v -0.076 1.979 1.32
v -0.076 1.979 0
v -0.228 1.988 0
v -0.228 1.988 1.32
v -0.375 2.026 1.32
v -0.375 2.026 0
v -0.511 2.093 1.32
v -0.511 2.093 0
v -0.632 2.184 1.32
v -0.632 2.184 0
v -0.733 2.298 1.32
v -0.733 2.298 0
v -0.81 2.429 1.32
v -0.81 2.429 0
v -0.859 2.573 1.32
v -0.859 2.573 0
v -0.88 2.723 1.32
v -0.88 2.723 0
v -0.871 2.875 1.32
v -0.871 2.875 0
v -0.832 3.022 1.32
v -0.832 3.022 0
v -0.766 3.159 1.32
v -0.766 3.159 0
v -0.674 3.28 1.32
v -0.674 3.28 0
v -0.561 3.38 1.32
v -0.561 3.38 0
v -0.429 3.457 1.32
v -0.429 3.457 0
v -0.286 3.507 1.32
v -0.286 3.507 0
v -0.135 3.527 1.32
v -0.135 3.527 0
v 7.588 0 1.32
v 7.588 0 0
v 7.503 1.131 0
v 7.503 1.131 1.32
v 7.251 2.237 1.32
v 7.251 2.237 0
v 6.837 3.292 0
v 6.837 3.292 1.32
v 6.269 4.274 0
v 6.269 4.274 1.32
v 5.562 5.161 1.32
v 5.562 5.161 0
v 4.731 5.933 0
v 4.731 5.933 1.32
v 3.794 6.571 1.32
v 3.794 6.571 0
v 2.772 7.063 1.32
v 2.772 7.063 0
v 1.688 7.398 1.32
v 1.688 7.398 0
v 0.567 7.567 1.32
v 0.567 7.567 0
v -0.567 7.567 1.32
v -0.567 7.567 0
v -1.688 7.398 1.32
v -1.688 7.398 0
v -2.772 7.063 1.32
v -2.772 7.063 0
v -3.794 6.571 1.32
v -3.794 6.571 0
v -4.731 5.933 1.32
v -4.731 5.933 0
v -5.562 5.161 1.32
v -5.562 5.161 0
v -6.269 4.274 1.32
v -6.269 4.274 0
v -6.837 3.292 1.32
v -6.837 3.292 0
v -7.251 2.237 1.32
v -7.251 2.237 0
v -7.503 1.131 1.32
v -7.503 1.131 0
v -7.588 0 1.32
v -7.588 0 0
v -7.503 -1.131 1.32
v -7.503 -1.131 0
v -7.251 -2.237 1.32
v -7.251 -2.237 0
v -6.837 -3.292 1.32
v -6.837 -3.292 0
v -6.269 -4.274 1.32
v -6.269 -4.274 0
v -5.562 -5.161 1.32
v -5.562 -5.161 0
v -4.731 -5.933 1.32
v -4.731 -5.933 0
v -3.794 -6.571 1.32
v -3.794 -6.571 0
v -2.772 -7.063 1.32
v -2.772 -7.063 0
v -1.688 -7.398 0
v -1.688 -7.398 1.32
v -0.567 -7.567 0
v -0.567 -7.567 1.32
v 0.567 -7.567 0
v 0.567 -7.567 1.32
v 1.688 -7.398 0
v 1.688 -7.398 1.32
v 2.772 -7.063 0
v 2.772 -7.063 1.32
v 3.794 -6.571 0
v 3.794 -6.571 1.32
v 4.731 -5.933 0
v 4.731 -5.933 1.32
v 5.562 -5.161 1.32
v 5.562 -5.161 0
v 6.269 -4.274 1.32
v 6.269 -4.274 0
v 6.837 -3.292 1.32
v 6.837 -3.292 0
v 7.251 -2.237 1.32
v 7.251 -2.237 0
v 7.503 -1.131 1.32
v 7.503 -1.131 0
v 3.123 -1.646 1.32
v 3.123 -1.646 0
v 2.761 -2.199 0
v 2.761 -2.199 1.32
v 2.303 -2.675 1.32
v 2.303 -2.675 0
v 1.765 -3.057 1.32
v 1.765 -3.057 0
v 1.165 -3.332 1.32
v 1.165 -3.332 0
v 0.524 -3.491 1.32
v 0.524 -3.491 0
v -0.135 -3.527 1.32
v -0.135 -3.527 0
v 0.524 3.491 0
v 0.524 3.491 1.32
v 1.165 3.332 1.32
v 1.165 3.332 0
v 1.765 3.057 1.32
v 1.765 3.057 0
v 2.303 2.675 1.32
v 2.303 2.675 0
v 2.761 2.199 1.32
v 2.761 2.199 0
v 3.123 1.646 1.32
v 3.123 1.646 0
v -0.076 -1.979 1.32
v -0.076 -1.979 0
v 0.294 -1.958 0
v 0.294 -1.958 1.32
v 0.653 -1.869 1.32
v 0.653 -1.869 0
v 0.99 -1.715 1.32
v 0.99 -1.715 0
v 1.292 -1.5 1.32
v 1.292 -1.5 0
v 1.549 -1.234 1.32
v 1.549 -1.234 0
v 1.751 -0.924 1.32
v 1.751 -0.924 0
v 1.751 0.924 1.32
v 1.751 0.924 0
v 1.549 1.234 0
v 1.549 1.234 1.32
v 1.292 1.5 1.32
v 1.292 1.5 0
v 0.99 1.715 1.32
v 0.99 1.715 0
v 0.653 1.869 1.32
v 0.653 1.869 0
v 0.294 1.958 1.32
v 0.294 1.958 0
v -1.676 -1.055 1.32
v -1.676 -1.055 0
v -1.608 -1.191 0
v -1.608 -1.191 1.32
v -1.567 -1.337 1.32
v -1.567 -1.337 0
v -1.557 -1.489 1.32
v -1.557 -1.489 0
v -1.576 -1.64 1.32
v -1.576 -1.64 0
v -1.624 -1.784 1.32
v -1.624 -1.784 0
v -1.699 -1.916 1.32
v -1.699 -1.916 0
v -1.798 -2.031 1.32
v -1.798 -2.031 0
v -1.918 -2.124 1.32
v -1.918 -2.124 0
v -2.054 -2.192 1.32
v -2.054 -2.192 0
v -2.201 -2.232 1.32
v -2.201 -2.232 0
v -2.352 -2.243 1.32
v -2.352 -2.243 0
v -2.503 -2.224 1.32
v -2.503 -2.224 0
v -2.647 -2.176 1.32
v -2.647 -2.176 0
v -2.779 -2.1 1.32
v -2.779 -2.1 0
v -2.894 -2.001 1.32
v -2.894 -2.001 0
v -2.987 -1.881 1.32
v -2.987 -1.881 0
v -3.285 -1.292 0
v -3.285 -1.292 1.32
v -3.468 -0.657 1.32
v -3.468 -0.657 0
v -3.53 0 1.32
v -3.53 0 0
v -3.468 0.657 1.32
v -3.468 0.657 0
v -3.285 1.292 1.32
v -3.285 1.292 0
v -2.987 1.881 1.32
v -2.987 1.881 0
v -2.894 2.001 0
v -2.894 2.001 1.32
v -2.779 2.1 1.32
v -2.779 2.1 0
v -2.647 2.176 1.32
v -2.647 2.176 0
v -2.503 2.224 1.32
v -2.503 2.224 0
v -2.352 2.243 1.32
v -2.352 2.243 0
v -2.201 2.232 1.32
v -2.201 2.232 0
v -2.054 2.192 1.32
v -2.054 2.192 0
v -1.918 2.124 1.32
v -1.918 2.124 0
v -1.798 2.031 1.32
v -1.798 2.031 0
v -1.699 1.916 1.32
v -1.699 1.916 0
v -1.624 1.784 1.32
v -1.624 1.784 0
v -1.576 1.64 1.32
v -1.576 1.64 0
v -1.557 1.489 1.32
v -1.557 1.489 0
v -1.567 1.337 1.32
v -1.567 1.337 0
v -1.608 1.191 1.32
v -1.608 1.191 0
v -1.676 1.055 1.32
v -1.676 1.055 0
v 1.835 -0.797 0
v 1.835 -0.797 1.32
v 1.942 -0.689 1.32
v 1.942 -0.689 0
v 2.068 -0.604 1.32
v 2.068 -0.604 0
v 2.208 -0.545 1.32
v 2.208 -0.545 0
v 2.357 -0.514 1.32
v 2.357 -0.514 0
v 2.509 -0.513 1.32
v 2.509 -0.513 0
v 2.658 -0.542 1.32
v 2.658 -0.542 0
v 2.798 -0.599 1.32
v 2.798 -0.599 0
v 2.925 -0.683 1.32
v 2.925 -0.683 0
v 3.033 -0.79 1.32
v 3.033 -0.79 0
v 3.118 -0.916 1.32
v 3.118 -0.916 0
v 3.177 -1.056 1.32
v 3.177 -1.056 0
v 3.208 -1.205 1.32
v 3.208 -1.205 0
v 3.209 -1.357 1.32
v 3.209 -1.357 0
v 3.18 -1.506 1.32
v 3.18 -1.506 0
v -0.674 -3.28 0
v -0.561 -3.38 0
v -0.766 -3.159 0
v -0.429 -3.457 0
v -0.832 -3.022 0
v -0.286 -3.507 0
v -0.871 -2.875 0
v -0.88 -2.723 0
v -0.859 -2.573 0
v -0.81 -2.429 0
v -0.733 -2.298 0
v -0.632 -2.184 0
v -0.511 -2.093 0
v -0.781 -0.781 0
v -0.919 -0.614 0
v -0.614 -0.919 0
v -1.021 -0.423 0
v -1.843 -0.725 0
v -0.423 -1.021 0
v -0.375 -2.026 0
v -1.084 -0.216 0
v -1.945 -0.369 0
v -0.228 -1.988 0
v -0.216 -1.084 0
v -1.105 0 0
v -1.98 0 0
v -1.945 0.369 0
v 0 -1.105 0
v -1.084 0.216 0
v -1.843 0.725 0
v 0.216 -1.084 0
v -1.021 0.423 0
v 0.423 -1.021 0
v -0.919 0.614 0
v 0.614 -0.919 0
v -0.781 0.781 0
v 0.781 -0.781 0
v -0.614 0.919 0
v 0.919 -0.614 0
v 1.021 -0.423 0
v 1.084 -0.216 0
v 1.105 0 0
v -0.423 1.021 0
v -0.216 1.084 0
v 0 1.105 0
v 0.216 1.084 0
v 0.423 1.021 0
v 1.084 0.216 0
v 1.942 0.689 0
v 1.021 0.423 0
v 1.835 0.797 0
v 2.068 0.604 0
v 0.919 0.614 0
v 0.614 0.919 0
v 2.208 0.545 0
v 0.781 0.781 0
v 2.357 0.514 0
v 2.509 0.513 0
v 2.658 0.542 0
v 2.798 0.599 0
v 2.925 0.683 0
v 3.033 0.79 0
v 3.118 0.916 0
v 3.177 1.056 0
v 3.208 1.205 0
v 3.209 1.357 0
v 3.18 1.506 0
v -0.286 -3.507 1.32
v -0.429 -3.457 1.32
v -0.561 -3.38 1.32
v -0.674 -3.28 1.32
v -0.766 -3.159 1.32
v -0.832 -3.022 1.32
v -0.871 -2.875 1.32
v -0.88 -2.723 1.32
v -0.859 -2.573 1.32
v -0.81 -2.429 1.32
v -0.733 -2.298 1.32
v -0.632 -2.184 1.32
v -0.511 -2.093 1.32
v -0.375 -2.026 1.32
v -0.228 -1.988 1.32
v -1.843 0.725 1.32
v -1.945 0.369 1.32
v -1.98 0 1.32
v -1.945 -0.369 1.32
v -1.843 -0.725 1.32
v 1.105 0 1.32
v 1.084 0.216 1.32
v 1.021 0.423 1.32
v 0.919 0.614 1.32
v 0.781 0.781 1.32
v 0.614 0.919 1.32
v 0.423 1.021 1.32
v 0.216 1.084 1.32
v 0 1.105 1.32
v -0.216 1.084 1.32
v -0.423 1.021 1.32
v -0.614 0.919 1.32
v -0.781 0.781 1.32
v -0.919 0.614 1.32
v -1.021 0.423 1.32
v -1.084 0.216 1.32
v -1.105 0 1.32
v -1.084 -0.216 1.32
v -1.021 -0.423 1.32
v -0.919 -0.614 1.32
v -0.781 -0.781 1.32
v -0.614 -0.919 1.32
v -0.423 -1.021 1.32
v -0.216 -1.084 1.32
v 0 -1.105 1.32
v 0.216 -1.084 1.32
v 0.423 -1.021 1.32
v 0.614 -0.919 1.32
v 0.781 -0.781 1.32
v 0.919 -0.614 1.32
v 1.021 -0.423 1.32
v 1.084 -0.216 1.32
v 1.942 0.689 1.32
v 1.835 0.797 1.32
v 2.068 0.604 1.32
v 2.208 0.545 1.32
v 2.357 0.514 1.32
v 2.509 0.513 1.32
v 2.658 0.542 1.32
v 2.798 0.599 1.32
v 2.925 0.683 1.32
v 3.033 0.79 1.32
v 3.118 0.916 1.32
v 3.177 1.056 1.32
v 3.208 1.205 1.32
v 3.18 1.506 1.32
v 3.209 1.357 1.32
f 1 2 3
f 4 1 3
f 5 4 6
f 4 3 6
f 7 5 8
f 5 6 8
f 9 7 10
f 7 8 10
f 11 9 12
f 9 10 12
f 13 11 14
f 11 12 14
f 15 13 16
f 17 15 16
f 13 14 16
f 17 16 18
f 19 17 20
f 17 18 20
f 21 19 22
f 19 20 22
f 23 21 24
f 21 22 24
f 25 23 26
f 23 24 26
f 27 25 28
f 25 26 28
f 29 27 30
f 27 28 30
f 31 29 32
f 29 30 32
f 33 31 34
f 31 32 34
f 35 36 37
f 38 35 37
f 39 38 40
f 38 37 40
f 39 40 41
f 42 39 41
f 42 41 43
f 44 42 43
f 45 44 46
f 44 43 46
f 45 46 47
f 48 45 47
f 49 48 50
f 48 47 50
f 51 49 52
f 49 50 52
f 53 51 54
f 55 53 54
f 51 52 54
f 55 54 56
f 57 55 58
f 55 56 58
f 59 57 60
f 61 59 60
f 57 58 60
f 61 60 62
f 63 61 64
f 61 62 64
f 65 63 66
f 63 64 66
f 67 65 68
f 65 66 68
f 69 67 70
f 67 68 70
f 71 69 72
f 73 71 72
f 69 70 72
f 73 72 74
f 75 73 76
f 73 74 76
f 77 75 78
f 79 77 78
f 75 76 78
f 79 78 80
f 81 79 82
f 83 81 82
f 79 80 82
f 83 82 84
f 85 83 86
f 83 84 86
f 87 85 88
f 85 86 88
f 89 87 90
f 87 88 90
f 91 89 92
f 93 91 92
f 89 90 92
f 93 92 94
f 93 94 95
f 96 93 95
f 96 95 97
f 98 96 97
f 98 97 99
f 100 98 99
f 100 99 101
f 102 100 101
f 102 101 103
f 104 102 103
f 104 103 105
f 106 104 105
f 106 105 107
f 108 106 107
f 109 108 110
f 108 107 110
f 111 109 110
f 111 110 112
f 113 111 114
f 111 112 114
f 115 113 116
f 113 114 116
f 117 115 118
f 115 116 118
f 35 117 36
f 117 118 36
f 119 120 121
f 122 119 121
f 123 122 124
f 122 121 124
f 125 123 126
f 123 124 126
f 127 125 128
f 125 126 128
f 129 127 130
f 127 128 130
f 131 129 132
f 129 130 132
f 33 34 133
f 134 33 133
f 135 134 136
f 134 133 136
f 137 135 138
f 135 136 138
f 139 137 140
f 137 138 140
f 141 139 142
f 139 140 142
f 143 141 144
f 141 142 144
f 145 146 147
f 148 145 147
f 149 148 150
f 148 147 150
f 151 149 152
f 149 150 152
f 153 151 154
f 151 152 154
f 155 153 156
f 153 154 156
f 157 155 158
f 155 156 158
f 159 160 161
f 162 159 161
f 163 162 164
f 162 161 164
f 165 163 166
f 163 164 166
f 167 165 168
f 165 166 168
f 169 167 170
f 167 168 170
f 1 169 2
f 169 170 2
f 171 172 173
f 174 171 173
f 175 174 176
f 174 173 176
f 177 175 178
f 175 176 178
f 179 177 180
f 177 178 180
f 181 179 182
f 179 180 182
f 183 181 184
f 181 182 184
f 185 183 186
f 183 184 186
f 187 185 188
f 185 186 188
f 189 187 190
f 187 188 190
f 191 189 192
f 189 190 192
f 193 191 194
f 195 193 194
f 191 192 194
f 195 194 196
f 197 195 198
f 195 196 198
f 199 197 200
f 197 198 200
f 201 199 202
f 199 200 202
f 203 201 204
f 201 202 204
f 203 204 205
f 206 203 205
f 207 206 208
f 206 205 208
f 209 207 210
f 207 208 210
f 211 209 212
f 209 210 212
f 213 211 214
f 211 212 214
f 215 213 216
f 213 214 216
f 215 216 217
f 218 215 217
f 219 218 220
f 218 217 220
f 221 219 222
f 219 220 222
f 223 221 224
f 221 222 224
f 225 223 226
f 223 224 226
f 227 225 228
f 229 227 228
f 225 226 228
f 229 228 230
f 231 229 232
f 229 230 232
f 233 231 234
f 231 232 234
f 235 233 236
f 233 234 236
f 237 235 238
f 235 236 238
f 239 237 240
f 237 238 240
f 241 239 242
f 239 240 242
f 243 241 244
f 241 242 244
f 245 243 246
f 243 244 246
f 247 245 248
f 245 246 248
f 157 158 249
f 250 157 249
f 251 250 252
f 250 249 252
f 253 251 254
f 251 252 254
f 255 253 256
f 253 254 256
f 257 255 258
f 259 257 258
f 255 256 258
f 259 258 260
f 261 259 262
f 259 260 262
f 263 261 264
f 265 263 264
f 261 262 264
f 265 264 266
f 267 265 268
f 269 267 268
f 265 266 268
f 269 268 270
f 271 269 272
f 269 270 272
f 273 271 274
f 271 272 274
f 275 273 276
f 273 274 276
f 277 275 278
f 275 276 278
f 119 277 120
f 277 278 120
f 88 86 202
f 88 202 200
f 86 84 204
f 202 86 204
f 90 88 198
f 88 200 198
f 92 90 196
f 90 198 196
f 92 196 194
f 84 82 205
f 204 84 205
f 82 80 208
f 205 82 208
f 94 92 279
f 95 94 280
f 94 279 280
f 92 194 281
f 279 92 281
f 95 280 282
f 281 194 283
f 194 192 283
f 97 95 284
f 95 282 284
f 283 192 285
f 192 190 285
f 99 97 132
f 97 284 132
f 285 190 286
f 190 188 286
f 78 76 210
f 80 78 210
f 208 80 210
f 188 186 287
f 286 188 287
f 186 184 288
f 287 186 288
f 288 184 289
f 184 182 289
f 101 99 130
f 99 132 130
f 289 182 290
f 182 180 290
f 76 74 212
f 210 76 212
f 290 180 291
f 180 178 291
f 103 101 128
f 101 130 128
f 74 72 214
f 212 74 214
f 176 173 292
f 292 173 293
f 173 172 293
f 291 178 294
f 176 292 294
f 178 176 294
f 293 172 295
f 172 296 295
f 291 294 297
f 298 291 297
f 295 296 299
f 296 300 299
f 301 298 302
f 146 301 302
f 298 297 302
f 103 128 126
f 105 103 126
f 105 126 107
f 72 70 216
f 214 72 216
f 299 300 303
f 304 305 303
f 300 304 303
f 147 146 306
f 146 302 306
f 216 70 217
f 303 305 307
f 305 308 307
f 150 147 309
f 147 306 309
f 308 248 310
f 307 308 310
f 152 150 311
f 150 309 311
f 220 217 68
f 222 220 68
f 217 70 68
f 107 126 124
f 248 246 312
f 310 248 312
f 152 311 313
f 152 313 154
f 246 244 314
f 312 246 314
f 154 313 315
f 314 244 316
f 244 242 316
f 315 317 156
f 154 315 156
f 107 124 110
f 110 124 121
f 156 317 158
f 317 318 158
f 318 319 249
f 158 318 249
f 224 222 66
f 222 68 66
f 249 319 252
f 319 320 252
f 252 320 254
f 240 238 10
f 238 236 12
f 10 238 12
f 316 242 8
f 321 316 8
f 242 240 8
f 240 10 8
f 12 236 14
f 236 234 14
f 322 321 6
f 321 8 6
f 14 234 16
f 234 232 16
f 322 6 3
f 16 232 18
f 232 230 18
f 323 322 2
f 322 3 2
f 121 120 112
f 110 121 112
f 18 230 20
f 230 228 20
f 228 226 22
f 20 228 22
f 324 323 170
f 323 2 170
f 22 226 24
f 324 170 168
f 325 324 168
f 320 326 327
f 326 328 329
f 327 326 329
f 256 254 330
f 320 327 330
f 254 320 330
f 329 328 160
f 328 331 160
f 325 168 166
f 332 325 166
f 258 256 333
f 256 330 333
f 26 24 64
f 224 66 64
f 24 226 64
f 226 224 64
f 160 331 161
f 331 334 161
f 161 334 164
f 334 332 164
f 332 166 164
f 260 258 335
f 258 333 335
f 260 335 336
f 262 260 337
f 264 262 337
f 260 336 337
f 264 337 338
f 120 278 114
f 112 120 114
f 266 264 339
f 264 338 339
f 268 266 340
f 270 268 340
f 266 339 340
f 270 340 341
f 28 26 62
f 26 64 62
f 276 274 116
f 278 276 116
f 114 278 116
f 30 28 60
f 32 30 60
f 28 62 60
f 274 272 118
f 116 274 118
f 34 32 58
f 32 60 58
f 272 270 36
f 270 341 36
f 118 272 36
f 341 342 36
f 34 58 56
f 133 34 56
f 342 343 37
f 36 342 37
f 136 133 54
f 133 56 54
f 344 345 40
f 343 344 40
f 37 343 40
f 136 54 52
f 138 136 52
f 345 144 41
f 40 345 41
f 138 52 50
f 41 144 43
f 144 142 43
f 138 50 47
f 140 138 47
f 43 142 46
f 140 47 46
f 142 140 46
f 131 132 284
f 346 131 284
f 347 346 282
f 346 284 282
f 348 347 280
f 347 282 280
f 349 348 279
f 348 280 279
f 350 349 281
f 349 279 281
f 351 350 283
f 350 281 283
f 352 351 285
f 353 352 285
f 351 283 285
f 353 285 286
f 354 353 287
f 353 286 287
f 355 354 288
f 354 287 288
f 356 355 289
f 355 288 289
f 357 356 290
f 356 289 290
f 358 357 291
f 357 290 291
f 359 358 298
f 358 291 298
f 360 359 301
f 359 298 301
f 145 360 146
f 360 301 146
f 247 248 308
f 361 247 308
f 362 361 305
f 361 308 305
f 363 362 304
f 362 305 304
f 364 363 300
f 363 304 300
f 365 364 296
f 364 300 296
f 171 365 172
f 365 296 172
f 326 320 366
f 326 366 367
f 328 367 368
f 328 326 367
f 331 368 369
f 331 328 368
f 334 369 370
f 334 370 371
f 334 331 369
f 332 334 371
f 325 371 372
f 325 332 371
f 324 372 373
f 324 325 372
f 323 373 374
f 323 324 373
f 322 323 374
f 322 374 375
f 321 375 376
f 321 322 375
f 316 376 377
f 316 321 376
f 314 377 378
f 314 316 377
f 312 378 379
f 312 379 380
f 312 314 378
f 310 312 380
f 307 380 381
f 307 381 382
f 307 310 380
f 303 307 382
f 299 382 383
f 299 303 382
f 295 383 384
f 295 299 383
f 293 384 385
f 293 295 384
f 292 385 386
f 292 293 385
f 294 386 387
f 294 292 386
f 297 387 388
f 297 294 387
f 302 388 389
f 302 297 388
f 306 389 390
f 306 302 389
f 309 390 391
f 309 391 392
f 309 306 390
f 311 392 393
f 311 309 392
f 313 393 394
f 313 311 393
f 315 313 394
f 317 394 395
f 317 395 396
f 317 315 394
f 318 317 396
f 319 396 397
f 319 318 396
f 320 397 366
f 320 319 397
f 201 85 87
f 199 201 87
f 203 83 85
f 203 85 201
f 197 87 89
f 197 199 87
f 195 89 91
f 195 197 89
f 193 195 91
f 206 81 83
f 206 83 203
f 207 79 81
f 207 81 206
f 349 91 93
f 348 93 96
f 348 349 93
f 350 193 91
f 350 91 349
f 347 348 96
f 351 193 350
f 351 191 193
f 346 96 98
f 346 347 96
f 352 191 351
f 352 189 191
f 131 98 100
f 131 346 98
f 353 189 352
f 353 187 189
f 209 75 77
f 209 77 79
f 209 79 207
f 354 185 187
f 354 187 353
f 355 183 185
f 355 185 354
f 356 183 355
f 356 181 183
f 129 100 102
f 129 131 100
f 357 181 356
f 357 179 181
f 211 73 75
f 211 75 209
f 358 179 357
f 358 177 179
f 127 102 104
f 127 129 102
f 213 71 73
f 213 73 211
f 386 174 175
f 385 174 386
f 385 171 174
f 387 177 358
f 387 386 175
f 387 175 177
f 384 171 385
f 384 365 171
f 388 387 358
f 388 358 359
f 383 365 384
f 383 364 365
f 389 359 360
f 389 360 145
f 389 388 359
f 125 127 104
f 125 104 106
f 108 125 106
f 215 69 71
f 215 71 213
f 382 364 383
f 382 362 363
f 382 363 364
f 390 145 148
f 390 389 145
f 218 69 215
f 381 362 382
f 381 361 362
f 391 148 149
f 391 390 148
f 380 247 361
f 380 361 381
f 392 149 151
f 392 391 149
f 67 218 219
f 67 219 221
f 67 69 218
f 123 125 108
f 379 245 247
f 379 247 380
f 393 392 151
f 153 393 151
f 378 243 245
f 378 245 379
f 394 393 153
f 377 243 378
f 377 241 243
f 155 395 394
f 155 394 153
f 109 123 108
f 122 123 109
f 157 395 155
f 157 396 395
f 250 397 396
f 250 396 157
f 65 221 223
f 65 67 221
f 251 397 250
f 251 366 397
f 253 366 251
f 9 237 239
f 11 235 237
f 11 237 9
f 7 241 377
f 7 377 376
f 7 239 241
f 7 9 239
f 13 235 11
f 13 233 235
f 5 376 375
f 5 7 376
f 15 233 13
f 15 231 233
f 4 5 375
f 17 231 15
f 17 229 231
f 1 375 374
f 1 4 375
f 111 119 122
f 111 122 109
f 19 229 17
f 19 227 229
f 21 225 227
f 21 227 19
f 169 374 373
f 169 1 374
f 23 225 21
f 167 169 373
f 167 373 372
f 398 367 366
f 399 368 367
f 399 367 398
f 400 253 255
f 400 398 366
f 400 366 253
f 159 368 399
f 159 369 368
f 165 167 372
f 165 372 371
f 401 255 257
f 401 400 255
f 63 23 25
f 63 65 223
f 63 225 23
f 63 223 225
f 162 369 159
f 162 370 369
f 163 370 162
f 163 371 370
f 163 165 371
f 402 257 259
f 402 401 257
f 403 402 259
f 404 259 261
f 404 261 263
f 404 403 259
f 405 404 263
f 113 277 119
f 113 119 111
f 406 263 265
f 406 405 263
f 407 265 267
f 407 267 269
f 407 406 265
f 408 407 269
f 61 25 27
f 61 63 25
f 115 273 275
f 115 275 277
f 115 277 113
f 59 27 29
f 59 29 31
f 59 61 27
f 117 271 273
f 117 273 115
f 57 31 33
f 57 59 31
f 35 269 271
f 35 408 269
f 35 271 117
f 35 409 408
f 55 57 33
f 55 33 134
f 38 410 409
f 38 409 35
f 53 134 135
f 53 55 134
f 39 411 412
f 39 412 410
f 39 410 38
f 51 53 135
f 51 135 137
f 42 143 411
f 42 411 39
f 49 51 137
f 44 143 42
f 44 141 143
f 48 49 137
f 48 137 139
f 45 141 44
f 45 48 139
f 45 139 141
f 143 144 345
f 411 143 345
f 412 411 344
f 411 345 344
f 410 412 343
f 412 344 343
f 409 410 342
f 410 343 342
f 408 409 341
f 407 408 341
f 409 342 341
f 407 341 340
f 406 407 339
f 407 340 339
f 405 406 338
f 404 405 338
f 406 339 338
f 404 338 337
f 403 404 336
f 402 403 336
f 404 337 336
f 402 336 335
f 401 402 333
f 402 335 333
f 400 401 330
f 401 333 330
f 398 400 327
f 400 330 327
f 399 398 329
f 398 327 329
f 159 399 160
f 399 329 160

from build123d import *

# Parameters (mm, degrees)
F0_R     = 7.588
F0_R_2   = 1.105
F1_DEPTH = 1.32


with BuildPart() as f1:
    # F0 (on Top) → F1 (new body)
    with BuildSketch(Plane.XY):
        Circle(F0_R)
        with BuildLine():
            ThreePointArc((-0.075923, -1.978544), (0.99, -1.71473), (1.751431, -0.923521))
            ThreePointArc((1.751431, -0.923521), (2.798444, -0.599465), (3.1225, -1.646479))
            ThreePointArc((3.1225, -1.646479), (1.765, -3.05707), (-0.135357, -3.527404))
            ThreePointArc((-0.135357, -3.527404), (-0.88007, -2.723257), (-0.075923, -1.978544))
        make_face(mode=Mode.SUBTRACT)
        with BuildLine():
            ThreePointArc((-2.987143, 1.880925), (-1.918374, 2.123791), (-1.675508, 1.055023))
            ThreePointArc((-1.675508, 1.055023), (-1.98, 0), (-1.675508, -1.055023))
            ThreePointArc((-1.675508, -1.055023), (-1.918374, -2.123791), (-2.987143, -1.880925))
            ThreePointArc((-2.987143, -1.880925), (-3.53, 0), (-2.987143, 1.880925))
        make_face(mode=Mode.SUBTRACT)
        Circle(F0_R_2, mode=Mode.SUBTRACT)
        with BuildLine():
            ThreePointArc((3.1225, 1.646479), (2.798444, 0.599465), (1.751431, 0.923521))
            ThreePointArc((1.751431, 0.923521), (0.99, 1.71473), (-0.075923, 1.978544))
            ThreePointArc((-0.075923, 1.978544), (-0.88007, 2.723257), (-0.135357, 3.527404))
            ThreePointArc((-0.135357, 3.527404), (1.765, 3.05707), (3.1225, 1.646479))
        make_face(mode=Mode.SUBTRACT)
    extrude(amount=F1_DEPTH)


solid = f1.part
